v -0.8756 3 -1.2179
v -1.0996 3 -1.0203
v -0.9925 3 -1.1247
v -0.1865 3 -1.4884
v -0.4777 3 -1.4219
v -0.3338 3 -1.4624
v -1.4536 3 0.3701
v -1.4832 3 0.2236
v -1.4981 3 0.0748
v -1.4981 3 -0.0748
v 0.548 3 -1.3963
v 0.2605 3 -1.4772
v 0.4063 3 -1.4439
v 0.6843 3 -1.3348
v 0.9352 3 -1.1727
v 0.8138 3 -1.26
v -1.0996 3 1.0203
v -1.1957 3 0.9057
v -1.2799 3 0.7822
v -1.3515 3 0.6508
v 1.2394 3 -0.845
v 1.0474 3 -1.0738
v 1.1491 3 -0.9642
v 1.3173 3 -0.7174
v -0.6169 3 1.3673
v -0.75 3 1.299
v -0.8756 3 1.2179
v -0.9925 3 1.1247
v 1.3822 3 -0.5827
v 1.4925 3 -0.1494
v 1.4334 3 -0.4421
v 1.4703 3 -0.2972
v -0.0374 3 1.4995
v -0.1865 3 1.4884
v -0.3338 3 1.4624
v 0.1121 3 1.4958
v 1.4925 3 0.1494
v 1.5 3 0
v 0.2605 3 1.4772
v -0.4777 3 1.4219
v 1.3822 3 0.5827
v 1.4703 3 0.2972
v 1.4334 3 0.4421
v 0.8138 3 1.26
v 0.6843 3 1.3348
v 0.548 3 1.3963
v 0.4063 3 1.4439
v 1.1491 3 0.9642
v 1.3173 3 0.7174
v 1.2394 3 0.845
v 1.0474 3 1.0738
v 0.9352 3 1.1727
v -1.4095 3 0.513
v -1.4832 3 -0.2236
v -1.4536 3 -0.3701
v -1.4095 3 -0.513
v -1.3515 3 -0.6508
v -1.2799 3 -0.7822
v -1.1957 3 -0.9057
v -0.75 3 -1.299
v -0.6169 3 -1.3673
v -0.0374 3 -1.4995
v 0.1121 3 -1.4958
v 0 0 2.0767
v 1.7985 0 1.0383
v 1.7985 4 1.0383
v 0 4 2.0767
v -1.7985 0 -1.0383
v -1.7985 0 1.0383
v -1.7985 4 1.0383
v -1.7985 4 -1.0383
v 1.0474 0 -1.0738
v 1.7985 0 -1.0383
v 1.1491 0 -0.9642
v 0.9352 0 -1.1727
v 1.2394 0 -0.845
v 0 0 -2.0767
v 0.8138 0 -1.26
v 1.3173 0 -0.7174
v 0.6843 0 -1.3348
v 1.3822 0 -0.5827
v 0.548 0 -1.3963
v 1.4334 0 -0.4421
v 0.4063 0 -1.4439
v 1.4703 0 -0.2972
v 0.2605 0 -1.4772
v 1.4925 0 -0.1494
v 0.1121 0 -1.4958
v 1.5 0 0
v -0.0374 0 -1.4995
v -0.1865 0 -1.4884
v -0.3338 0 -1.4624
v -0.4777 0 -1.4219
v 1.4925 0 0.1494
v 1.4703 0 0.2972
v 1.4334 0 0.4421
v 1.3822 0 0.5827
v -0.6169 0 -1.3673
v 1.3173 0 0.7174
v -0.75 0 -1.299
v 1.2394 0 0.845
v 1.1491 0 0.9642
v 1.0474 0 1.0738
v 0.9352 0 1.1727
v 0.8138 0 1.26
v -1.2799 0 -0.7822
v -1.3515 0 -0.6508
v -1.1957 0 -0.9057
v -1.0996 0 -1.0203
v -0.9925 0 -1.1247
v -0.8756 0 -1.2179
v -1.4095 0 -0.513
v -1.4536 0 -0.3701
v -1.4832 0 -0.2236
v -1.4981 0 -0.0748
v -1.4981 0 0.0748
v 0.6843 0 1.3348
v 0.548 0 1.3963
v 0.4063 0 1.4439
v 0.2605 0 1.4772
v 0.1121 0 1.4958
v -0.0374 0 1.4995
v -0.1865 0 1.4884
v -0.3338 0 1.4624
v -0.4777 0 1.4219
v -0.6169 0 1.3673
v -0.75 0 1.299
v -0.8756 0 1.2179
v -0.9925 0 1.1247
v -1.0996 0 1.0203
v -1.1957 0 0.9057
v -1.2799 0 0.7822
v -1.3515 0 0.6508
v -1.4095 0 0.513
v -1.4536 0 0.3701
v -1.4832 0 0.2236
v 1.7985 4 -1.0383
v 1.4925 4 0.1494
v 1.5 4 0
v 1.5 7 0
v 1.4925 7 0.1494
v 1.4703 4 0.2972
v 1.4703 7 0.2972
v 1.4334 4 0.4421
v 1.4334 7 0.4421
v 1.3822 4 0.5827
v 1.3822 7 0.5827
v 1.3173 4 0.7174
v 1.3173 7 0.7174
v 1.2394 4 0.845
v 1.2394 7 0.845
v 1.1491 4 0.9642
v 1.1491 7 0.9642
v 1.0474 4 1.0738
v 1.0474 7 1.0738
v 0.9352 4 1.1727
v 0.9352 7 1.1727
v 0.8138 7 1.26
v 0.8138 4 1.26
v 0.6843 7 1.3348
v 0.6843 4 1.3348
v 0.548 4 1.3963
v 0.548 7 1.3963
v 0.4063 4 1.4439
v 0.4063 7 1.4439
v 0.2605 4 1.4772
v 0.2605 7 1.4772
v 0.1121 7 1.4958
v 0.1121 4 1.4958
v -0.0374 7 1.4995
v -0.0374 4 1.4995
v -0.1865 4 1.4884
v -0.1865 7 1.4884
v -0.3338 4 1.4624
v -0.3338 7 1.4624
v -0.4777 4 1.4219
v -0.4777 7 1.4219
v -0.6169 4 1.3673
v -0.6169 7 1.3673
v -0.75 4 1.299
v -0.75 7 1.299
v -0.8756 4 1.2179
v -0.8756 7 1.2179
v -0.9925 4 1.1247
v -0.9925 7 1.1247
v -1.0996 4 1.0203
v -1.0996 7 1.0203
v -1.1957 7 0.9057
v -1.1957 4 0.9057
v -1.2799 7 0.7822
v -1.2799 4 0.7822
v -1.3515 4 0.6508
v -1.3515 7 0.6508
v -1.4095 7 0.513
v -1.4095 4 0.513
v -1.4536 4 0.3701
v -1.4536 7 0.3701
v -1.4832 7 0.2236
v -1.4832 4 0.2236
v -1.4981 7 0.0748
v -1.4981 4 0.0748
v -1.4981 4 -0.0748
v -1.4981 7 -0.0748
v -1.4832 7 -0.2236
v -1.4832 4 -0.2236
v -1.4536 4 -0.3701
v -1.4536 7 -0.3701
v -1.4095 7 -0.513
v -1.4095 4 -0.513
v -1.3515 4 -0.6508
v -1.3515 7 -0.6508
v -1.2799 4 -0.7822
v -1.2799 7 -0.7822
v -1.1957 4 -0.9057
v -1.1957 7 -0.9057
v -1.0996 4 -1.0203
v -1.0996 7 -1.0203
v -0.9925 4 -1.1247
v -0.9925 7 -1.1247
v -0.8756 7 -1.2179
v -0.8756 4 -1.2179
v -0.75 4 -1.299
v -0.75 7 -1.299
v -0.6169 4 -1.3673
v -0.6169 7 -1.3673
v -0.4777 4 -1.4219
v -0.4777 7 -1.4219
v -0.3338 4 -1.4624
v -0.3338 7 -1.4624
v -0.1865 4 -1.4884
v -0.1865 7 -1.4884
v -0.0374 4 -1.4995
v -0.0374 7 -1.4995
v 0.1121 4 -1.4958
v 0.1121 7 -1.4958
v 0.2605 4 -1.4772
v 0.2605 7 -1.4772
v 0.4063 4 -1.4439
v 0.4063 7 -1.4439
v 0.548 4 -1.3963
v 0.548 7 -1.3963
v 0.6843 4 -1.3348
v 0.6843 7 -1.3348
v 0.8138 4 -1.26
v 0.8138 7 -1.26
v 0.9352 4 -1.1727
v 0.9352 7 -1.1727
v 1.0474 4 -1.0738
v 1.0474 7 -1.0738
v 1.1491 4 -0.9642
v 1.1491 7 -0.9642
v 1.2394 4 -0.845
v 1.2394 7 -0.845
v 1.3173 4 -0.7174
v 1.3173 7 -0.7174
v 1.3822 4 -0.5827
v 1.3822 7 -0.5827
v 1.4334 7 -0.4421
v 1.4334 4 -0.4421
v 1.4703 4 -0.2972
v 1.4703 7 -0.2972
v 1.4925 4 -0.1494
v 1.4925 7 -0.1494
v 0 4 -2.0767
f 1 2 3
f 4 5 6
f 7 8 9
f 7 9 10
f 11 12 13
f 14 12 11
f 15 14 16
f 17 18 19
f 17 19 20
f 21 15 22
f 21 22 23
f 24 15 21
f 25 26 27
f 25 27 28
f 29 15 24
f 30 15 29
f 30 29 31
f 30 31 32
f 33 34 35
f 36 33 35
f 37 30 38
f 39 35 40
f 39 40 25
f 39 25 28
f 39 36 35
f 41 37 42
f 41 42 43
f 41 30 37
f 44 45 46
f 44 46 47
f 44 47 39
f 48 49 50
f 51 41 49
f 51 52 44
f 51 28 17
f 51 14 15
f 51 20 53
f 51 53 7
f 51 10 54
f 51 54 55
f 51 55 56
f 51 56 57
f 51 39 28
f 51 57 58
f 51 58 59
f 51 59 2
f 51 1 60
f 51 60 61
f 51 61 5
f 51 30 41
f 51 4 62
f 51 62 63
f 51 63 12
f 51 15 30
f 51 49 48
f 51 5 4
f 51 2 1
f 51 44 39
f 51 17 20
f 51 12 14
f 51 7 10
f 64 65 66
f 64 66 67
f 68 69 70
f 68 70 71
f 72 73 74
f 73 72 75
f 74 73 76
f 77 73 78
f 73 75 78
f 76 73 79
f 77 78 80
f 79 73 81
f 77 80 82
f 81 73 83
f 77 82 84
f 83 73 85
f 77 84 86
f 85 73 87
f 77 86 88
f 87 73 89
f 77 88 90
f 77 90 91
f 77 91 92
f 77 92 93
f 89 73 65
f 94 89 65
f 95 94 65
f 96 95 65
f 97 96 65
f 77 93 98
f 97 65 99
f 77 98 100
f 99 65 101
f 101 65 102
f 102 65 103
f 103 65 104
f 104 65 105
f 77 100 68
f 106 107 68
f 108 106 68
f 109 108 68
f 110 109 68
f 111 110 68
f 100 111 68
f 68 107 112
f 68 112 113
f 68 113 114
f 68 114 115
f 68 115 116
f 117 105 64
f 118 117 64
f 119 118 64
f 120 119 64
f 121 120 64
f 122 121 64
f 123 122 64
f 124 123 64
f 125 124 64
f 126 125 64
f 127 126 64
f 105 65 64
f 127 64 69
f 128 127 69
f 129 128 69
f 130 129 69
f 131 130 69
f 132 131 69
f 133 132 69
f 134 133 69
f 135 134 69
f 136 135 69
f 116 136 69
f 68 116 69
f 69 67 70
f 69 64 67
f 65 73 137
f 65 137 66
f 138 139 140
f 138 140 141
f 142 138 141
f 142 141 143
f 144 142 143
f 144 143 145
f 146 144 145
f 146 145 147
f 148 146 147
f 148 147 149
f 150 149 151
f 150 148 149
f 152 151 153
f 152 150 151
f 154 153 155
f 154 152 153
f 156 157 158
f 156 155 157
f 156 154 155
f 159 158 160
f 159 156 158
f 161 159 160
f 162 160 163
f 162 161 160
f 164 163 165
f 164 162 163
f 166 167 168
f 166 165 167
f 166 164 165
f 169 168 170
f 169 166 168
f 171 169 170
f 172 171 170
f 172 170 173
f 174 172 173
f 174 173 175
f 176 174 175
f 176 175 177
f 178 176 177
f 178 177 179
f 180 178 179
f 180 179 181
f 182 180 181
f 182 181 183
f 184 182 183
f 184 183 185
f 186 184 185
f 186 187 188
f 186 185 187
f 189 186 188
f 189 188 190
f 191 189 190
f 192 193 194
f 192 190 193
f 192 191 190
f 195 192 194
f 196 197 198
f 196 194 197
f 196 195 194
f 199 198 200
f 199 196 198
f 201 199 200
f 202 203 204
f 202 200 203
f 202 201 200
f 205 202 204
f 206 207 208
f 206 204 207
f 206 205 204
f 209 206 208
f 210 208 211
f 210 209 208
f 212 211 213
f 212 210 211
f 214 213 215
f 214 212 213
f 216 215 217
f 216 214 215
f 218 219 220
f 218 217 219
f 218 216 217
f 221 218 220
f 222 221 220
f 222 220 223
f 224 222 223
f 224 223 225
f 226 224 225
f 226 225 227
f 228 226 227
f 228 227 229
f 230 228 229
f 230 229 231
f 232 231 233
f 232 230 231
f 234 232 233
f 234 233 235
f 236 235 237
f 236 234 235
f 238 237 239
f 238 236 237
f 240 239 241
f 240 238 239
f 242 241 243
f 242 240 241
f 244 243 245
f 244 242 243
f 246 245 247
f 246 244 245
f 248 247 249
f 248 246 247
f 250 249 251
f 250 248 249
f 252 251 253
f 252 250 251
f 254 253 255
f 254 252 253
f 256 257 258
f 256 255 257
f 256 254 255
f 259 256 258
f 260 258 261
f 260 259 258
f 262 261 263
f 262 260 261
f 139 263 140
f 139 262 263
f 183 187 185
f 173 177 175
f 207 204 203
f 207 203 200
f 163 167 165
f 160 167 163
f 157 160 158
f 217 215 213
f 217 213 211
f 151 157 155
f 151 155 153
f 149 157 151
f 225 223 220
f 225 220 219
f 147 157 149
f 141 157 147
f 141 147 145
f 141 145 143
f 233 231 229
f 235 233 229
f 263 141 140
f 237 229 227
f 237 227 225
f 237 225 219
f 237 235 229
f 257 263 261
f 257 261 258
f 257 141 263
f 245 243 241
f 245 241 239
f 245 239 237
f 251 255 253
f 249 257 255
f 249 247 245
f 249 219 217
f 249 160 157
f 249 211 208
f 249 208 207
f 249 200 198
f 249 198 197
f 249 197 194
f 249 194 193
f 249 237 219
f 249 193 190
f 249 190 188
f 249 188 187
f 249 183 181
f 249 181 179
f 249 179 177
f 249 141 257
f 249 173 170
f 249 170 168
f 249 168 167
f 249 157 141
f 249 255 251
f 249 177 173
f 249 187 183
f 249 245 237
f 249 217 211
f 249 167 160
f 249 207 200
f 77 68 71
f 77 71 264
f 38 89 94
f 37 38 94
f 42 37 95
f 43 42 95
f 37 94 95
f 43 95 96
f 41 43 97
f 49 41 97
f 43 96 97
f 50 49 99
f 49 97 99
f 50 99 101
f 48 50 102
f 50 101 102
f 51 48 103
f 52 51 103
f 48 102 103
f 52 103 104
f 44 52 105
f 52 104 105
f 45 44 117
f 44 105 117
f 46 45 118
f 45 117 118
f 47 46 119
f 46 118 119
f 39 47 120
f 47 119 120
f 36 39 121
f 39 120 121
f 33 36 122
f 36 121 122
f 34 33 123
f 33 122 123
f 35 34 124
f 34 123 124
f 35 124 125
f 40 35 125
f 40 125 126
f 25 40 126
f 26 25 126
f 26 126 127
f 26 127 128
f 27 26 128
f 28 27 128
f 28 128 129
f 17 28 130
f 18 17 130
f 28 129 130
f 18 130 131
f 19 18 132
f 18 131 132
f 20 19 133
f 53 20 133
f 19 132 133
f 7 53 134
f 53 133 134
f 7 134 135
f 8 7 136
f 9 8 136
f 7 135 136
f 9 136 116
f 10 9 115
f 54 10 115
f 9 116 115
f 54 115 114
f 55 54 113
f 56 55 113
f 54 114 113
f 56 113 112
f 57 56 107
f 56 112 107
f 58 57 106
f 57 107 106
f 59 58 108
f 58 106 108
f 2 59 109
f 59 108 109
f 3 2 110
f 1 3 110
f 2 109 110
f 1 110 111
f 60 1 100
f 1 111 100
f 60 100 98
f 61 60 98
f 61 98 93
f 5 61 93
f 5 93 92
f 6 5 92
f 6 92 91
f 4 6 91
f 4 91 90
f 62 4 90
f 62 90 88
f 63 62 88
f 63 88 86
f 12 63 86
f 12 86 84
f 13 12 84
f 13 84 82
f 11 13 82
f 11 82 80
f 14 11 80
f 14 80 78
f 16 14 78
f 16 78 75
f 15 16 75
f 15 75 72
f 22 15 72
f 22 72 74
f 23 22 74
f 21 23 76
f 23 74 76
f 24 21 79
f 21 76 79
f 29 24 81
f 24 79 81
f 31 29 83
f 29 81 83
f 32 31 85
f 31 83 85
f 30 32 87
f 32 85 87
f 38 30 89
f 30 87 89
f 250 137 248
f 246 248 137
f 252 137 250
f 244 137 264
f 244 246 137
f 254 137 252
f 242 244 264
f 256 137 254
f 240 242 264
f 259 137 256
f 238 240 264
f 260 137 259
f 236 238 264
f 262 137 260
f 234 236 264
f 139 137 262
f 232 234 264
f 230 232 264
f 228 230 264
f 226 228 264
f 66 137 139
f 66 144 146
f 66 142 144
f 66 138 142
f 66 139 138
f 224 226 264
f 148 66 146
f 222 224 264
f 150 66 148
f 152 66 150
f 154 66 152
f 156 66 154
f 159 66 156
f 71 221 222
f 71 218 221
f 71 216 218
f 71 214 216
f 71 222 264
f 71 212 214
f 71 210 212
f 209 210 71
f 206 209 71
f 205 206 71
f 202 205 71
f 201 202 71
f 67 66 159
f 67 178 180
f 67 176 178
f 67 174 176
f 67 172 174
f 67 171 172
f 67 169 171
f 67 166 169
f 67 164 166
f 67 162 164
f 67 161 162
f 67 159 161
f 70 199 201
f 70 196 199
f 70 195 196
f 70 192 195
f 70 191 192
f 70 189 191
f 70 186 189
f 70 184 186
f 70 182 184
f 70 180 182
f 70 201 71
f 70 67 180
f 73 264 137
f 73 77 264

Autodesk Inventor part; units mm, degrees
ref_plane "YZ Plane" through (0, 0, 0) normal (1, 0, 0) x (0, 1, 0)
ref_plane "XZ Plane" through (0, 0, 0) normal (0, 1, 0) x (-1, 0, 0)
ref_plane "XY Plane" through (0, 0, 0) normal (0, 0, 1) x (1, 0, 0)
sketch "Sketch1" plane through (0, 0, 0) normal (0, 1, 0) x (-1, 0, 0)
  line L0 (1.7985, -1.0383) -> (0, -2.0767)
  line L1 (0, -2.0767) -> (-1.7985, -1.0383)
  line L2 (-1.7985, -1.0383) -> (-1.7985, 1.0383)
  line L3 (-1.7985, 1.0383) -> (0, 2.0767)
  line L4 (0, 2.0767) -> (1.7985, 1.0383)
  line L5 (1.7985, 1.0383) -> (1.7985, -1.0383)
  point P0 (0, 0)
  point P1 (0, 0)
  point P2 (0, 0)
extrude "Extrusion1" add sketch "Sketch1" along normal blind 4
sketch "Sketch2" plane through (0, 4, 0) normal (0, 1, 0) x (1, 0, 0)
  circle A0 centre (0, 0) radius 1.5
  dimension "d3" = 3
extrude "Extrusion2" add sketch "Sketch2" along normal blind 3
thread "Thread1" size "M3x0.35" class "6g" standard "ANSI Metric M Profile" full length
sketch "Sketch3" plane through (0, 0, 0) normal (0, -1, 0) x (1, 0, 0)
  circle A0 centre (0, 0) radius 1.5
  dimension "d8" = 3
extrude "Extrusion3" cut sketch "Sketch3" against normal blind 3
thread "Thread2" size "M3x0.35" class "6H" standard "ANSI Metric M Profile" full length
properties part number "Standoff"
